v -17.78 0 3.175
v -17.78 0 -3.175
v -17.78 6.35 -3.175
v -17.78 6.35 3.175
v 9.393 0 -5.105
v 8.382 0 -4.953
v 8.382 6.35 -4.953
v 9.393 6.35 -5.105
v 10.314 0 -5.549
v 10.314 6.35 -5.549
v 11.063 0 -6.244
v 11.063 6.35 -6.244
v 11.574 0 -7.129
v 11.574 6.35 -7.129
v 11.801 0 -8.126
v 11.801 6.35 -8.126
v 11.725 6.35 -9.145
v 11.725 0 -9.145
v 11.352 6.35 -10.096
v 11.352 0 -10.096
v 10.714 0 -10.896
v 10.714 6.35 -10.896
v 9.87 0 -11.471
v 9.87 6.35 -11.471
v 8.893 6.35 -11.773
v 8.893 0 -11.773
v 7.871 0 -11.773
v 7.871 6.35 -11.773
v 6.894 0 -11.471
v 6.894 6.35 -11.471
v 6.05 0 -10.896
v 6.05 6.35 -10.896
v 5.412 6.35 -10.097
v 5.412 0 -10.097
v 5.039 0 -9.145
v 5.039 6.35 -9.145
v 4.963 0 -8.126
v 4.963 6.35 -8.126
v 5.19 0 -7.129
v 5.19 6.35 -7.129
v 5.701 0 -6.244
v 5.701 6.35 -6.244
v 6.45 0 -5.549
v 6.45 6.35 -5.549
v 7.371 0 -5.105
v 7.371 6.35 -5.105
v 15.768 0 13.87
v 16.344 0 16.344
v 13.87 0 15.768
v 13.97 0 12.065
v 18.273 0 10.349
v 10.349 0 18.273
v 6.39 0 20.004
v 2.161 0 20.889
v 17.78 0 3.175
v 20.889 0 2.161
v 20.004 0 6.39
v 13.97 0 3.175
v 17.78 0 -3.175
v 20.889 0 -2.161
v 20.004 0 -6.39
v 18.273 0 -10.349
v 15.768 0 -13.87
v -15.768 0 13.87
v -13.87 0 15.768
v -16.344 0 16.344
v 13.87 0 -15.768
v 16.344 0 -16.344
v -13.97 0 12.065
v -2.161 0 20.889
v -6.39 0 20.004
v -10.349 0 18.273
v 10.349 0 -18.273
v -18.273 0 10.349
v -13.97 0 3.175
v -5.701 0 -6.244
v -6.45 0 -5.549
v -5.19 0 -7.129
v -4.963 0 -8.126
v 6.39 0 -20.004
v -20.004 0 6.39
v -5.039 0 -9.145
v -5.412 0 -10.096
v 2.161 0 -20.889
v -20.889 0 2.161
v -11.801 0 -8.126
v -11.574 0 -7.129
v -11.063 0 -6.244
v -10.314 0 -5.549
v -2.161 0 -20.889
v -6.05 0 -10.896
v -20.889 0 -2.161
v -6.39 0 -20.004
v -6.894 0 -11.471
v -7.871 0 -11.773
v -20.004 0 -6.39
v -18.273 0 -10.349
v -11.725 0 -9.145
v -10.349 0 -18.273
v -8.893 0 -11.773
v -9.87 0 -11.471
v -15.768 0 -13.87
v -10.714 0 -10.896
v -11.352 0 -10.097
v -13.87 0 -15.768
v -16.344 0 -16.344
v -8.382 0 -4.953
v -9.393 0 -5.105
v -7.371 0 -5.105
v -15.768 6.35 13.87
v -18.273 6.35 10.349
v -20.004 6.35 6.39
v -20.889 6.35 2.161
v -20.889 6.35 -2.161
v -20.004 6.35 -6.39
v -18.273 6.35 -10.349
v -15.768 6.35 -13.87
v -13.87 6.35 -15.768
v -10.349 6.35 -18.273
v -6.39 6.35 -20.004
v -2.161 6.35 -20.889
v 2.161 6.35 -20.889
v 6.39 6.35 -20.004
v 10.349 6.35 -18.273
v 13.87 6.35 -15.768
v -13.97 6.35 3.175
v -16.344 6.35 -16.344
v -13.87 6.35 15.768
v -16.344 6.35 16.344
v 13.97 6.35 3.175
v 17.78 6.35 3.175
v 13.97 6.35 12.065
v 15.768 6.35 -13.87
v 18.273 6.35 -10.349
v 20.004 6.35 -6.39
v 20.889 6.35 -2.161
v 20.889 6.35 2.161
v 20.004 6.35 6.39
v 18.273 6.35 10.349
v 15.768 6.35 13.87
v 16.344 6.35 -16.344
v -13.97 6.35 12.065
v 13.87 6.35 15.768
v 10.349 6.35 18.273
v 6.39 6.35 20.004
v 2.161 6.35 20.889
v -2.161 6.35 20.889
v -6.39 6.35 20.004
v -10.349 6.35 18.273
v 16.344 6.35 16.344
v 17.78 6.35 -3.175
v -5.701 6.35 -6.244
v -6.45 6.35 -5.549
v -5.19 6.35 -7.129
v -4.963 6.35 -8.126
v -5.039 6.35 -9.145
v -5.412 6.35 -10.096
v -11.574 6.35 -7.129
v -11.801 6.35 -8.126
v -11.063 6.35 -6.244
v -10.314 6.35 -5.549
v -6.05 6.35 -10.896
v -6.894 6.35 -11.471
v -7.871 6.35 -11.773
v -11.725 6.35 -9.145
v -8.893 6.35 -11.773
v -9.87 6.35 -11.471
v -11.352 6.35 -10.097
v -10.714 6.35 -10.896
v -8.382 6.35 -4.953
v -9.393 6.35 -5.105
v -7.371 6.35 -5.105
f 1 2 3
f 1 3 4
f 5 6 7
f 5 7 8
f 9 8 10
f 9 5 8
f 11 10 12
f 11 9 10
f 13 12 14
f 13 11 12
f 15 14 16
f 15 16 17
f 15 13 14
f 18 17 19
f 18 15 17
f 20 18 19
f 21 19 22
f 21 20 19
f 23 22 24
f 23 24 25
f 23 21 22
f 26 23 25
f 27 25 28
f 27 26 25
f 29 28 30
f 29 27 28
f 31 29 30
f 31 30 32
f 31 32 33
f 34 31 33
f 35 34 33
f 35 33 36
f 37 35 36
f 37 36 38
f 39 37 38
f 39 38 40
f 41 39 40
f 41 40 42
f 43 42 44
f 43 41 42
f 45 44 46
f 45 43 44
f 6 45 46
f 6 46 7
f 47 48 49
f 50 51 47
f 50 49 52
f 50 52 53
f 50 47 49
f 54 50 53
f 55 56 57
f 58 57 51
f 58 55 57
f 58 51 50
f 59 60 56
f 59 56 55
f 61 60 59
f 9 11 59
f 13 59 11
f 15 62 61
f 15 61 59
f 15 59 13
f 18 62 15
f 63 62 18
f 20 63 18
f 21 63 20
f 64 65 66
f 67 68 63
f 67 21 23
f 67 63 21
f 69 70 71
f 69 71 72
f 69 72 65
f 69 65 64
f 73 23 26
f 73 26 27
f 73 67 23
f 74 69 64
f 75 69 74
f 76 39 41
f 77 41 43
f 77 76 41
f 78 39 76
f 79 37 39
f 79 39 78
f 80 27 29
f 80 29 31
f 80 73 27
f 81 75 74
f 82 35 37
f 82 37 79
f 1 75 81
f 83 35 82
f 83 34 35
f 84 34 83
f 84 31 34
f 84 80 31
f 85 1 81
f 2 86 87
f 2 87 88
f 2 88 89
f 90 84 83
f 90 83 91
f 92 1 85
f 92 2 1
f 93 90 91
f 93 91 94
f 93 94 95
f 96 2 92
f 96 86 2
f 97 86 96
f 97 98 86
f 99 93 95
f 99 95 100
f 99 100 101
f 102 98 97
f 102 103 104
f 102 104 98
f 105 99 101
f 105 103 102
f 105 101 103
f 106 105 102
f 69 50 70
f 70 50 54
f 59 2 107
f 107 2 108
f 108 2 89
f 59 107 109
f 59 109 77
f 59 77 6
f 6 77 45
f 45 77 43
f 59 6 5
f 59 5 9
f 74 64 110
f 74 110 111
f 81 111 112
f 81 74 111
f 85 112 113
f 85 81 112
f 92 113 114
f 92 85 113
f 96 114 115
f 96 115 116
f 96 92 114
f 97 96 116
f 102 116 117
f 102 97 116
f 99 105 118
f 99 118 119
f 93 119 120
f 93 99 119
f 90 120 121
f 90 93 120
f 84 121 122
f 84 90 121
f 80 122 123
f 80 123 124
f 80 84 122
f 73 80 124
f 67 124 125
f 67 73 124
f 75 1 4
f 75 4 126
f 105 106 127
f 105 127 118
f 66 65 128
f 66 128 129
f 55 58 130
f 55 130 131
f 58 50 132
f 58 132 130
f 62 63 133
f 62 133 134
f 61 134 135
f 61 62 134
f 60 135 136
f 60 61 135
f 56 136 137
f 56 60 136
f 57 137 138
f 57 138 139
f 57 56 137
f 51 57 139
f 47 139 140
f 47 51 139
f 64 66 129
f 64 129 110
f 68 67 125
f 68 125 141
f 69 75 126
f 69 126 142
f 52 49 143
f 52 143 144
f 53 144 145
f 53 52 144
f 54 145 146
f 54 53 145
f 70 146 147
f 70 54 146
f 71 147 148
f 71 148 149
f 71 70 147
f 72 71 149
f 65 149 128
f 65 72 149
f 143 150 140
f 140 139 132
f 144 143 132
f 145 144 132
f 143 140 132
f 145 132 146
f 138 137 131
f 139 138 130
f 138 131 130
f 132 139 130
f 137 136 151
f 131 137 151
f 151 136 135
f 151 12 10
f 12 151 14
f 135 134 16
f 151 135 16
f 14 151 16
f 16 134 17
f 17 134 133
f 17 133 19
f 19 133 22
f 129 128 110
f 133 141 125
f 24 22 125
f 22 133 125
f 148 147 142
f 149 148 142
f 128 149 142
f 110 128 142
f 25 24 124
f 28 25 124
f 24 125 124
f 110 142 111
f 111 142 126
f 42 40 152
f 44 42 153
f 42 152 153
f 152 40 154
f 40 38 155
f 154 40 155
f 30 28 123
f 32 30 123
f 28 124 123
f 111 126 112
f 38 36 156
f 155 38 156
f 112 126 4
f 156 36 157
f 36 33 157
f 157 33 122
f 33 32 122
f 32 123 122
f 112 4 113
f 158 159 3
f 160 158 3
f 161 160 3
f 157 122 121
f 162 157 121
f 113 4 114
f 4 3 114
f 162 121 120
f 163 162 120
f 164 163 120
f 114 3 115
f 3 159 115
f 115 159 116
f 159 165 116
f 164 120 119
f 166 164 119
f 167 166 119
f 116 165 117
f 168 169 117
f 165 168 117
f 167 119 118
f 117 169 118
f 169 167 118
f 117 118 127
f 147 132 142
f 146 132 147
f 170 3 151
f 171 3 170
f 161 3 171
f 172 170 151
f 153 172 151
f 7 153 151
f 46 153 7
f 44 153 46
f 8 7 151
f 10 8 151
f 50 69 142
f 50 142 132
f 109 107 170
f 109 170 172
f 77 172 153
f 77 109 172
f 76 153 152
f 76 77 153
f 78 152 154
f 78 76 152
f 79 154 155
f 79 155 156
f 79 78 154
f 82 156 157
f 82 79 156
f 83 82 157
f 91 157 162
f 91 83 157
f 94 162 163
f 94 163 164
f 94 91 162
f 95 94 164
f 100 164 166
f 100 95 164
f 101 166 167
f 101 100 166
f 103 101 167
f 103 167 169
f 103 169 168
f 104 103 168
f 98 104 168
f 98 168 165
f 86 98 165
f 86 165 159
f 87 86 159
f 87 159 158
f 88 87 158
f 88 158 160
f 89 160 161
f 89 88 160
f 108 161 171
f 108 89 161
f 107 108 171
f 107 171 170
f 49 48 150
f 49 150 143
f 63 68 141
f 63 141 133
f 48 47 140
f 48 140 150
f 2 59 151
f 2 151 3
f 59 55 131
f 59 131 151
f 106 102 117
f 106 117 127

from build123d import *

# Parameters (mm, degrees)
SKETCH1_R           = 3.429
BOSS_EXTRUDE1_DEPTH = 6.35


with BuildPart() as part:
    # Sketch1 → Boss-Extrude1 (new body)
    with BuildSketch(Plane(origin=(0, 0, 0), x_dir=(1, 0, 0), z_dir=(0, 1, 0))):
        with BuildLine():
            Line((13.870085237, 15.767711804), (16.343875029, 16.343875029))
            Line((16.343875029, 16.343875029), (15.767711804, 13.870085237))
            ThreePointArc((15.767711804, 13.870085237), (21, 0), (15.767711804, -13.870085237))
            Line((15.767711804, -13.870085237), (16.343875029, -16.343875029))
            Line((16.343875029, -16.343875029), (13.870085237, -15.767711804))
            ThreePointArc((13.870085237, -15.767711804), (0, -21), (-13.870085237, -15.767711804))
            Line((-13.870085237, -15.767711804), (-16.343875029, -16.343875029))
            Line((-16.343875029, -16.343875029), (-15.767711804, -13.870085237))
            ThreePointArc((-15.767711804, -13.870085237), (-21, 0), (-15.767711804, 13.870085237))
            Line((-15.767711804, 13.870085237), (-16.343875029, 16.343875029))
            Line((-16.343875029, 16.343875029), (-13.870085237, 15.767711804))
            ThreePointArc((-13.870085237, 15.767711804), (0, 21), (13.870085237, 15.767711804))
        make_face()
        with Locations(Location((-8.382, 8.382, 0), (0, 0, 270))):
            Circle(SKETCH1_R, mode=Mode.SUBTRACT)
        with Locations(Location((8.382, 8.382, 0), (0, 0, 270))):
            Circle(SKETCH1_R, mode=Mode.SUBTRACT)
        Polygon((-13.97, -3.175), (-13.97, -12.065), (13.97, -12.065), (13.97, -3.175), (17.78, -3.175), (17.78, 3.175), (-17.78, 3.175), (-17.78, -3.175), align=None, mode=Mode.SUBTRACT)
    extrude(amount=BOSS_EXTRUDE1_DEPTH)


solid = part.part
